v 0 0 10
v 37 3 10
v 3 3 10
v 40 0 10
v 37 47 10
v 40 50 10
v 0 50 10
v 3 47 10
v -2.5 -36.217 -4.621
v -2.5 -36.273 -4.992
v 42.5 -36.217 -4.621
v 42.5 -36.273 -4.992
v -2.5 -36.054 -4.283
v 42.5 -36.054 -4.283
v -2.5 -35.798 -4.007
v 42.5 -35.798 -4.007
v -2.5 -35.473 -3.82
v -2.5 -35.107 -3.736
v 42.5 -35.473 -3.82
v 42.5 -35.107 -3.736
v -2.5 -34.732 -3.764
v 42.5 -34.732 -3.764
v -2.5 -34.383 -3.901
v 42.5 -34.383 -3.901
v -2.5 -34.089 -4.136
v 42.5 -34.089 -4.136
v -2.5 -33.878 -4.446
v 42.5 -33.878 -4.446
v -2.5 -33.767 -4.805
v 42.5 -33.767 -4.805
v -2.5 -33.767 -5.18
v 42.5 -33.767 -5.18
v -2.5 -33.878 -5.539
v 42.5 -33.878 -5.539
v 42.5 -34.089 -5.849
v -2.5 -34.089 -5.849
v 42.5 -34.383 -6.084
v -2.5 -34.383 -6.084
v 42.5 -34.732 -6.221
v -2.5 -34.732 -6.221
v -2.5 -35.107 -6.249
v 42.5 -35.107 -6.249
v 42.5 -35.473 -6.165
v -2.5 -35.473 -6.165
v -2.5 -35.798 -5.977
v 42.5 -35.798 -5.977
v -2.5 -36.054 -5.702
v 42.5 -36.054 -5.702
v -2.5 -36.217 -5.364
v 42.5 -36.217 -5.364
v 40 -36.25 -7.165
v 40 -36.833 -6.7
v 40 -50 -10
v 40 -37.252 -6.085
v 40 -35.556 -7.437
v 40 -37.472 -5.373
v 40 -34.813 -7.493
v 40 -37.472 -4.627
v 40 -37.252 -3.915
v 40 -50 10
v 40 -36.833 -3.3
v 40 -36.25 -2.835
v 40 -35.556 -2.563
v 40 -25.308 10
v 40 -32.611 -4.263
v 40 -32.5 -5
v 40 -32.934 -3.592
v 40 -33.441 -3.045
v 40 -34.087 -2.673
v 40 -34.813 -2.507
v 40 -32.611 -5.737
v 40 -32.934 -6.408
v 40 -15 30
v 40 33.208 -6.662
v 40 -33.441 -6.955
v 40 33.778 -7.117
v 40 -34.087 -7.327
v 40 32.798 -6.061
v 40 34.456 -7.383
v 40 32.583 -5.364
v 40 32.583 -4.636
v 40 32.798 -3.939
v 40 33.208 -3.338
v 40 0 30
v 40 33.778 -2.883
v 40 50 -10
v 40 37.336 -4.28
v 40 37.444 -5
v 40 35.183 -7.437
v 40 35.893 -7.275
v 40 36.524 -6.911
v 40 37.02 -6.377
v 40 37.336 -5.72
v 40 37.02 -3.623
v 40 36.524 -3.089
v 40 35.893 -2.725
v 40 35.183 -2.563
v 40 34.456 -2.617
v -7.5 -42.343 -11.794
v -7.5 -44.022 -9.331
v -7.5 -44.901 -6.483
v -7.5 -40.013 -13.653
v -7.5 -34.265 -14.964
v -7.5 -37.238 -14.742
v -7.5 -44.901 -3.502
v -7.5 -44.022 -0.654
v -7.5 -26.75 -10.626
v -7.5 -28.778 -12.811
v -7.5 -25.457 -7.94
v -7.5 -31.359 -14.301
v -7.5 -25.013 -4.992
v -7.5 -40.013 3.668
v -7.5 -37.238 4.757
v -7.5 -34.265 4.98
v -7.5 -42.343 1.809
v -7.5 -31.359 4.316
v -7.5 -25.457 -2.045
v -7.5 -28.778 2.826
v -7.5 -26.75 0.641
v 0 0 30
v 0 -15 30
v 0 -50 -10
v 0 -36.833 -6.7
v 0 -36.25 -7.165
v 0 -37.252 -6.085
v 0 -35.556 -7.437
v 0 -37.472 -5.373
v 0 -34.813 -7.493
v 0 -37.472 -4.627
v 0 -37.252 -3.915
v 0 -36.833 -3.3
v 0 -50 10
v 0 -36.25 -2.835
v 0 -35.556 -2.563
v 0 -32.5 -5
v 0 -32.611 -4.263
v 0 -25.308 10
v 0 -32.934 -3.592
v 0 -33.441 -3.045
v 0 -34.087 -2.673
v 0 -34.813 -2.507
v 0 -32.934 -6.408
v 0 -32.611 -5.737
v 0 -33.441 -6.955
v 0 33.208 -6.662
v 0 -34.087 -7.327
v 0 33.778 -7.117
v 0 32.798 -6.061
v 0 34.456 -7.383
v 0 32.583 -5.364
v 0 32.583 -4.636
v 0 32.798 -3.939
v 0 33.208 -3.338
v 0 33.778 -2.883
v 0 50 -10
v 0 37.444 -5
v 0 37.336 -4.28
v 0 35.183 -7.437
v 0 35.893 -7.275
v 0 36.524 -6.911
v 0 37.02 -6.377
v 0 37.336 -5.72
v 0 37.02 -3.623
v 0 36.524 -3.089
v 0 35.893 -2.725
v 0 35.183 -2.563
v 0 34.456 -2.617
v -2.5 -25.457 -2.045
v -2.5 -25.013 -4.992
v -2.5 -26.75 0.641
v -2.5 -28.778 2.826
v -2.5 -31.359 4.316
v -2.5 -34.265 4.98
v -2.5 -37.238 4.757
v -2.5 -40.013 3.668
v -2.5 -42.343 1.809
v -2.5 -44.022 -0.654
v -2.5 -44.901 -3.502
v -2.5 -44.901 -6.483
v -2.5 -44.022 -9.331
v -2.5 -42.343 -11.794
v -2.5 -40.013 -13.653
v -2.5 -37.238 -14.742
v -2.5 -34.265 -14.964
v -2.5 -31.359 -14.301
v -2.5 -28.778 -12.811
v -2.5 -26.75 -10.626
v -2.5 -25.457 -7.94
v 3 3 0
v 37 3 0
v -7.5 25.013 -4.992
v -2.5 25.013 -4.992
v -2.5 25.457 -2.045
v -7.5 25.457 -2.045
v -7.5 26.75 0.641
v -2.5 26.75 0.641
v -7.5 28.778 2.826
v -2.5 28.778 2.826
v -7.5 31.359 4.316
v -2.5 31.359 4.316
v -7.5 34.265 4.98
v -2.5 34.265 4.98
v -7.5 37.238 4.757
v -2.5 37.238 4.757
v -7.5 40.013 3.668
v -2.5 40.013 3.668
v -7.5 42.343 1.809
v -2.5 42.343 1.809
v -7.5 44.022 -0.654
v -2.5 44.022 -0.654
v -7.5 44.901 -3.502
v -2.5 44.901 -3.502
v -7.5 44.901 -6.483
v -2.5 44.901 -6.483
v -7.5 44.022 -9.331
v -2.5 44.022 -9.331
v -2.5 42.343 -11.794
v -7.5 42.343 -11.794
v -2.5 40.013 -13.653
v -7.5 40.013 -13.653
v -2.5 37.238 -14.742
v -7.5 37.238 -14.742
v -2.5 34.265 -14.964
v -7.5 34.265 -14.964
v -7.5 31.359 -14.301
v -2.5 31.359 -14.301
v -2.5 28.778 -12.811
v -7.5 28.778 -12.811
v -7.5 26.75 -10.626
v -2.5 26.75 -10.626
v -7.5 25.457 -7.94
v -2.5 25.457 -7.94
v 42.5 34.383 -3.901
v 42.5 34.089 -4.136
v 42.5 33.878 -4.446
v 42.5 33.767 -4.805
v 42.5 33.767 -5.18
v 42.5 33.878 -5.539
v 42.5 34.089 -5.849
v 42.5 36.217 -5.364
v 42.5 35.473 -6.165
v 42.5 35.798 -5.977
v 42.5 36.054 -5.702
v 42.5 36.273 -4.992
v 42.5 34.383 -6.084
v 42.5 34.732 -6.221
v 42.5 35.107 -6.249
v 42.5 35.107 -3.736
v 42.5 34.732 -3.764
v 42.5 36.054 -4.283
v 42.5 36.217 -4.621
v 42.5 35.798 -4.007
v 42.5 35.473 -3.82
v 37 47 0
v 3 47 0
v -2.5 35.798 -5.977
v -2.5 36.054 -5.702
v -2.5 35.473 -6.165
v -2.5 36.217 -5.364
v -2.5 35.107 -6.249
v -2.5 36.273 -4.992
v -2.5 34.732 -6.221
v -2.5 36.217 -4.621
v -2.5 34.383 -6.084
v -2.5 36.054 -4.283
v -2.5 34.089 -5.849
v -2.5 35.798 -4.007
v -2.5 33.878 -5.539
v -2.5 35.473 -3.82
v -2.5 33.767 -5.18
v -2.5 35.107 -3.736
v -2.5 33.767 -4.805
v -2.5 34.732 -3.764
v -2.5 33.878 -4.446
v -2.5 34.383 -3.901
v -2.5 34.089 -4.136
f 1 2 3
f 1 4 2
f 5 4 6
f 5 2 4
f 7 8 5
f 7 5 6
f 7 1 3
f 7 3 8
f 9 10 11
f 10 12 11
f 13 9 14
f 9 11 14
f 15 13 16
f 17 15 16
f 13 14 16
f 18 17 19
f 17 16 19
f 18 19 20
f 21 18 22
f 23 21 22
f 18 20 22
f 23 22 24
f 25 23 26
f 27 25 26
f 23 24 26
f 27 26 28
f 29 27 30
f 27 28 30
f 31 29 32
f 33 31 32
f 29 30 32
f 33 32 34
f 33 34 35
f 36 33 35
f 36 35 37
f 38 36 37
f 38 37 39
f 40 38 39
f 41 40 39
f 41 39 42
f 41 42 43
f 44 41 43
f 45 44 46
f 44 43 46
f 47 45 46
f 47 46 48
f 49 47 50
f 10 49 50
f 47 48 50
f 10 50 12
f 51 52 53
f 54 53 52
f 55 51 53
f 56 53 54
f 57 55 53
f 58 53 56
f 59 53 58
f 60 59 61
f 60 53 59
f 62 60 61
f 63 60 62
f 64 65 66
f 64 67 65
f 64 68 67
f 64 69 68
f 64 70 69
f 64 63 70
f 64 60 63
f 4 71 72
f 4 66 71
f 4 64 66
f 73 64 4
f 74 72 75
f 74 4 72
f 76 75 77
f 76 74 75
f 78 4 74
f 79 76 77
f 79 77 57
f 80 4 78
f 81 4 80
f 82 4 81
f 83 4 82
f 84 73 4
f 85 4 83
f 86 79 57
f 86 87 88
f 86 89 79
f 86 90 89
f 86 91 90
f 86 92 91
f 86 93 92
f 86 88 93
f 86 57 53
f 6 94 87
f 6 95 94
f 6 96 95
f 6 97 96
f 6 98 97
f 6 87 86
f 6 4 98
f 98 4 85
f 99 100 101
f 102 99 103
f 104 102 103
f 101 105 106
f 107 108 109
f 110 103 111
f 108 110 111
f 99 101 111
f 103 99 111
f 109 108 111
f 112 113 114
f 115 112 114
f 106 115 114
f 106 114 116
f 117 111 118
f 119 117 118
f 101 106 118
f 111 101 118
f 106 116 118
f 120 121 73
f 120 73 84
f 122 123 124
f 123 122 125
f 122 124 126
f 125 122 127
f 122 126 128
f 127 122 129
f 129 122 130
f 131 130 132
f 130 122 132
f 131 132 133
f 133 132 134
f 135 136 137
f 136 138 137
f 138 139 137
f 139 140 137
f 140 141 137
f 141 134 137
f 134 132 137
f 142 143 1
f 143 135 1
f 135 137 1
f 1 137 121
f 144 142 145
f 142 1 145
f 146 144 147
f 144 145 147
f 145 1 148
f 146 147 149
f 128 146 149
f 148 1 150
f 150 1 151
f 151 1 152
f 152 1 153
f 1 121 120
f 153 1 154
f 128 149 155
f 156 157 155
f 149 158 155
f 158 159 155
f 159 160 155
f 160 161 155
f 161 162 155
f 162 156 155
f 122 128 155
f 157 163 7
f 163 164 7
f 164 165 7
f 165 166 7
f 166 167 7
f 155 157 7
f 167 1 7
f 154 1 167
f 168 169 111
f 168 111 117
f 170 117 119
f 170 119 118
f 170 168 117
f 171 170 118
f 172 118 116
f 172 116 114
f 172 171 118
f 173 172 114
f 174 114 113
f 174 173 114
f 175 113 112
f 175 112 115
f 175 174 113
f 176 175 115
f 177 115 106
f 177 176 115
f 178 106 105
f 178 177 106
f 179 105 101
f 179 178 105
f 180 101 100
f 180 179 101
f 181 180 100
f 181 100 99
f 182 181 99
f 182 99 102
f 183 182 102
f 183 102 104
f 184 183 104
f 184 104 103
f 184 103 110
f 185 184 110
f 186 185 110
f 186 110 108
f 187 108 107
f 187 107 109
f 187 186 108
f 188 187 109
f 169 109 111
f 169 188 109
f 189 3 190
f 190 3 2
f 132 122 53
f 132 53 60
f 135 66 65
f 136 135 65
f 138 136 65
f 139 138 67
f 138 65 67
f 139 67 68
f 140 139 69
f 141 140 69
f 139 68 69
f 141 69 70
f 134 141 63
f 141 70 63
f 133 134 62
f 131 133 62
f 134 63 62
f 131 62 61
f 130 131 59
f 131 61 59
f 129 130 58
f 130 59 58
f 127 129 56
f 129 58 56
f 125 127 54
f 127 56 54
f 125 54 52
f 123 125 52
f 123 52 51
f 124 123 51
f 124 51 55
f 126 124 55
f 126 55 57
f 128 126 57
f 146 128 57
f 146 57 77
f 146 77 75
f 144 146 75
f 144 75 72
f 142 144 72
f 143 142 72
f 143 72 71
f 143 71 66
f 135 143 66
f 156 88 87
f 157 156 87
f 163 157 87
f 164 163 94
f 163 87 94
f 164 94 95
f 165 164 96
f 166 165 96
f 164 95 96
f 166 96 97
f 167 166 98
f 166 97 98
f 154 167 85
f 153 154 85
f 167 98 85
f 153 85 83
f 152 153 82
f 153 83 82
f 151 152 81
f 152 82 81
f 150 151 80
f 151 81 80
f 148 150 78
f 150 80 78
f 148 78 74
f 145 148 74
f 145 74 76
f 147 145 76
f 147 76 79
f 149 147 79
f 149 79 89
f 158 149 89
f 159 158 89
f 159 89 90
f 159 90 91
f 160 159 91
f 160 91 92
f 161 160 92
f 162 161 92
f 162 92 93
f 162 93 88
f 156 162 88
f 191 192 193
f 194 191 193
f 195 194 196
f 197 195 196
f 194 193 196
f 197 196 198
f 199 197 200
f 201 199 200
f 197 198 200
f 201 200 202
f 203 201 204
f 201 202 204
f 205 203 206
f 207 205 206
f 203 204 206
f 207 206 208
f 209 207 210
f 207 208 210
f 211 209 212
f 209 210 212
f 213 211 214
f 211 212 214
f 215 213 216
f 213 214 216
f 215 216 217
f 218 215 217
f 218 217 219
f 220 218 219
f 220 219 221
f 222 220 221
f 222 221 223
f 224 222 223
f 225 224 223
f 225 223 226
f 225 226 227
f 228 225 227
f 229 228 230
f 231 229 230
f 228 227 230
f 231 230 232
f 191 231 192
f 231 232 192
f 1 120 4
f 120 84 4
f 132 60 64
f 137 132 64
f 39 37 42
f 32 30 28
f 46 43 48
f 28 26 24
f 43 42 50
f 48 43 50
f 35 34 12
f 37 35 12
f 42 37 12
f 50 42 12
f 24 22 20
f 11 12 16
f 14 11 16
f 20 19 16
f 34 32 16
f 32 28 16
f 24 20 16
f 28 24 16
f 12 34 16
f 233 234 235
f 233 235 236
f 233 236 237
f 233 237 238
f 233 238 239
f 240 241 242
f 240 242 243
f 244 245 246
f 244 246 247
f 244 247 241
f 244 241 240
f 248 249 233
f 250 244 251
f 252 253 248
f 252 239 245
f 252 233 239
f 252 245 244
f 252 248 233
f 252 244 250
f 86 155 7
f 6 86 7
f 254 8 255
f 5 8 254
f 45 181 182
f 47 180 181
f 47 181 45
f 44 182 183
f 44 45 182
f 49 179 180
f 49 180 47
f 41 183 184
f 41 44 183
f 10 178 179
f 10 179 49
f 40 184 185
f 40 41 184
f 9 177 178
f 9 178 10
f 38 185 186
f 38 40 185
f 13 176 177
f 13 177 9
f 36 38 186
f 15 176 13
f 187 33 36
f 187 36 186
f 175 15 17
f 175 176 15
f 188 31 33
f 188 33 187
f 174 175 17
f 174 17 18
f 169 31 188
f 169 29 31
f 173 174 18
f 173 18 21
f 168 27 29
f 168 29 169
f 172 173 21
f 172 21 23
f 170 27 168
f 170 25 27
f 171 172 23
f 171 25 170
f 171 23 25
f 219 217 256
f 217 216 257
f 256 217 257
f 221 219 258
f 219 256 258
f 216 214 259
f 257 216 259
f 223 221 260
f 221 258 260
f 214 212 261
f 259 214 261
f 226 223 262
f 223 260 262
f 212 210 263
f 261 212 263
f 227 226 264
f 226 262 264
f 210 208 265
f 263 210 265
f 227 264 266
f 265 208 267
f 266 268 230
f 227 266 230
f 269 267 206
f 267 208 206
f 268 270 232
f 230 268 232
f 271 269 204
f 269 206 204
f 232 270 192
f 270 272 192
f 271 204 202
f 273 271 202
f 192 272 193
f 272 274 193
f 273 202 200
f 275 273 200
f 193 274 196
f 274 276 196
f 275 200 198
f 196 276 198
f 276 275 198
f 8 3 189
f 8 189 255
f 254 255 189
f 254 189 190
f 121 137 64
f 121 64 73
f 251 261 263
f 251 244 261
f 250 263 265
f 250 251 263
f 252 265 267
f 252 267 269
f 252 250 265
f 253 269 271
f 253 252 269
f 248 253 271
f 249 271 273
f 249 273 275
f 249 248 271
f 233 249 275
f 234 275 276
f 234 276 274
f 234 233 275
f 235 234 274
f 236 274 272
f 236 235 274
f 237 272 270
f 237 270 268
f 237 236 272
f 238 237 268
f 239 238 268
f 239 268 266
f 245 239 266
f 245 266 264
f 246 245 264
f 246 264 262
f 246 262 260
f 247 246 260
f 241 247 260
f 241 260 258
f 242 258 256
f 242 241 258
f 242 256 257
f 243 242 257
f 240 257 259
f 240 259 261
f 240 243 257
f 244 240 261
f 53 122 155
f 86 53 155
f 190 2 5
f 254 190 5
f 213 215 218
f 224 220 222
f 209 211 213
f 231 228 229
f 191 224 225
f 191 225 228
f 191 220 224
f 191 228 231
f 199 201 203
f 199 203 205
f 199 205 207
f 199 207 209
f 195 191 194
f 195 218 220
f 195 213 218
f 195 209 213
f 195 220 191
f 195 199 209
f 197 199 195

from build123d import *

# Parameters (mm, degrees)
F0_W      = 100
F0_H      = 20
F1_DEPTH  = 40
F5_R      = 2.5
F5_R_2    = 2.444231729
F6_DEPTH  = 40.0010001
F7_W      = 34
F7_H      = 44
F8_DEPTH  = 10
F9_R      = 1.2598965516
F10_DEPTH = 42.5
F11_DEPTH = 2.5
F12_R     = 10
F13_DEPTH = 5


# Not quite as in the source:
# - a feature of the source that left no trace in its solid (it failed there, or was rolled back) is left out
# - the program builds the solid bodies; features that only make, move or delete a surface that nothing else refers to are left out


with BuildPart() as f1:
    # F0 (on Right) → F1 (new body)
    with BuildSketch(Plane.YZ):
        Rectangle(F0_W, F0_H)
    extrude(amount=F1_DEPTH)

    # F3 (on face) → F4 section 0
    with BuildSketch(Plane(origin=(0, 0, 0), x_dir=(0, -1, 0), z_dir=(-1, 0, 0))):
        Polygon((0, 30), (0, 10), (25.307764064, 10), (15, 30), align=None)
    # F2 (on face) → F4 section 1
    with BuildSketch(Plane.YZ.offset(40)):
        Polygon((-25.307764064, 10), (0, 10), (0, 30), (-15, 30), align=None)
    loft()

    # F5 (on face) → F6 (cut, through all)
    with BuildSketch(Plane.YZ.offset(40)):
        with Locations((-35, -5)):
            Circle(F5_R)
        with Locations((35, -5)):
            Circle(F5_R_2)
    extrude(amount=-F6_DEPTH, mode=Mode.SUBTRACT)

    # F7 (on face) → F8 (cut)
    with BuildSketch(Plane.XY.offset(10)):
        with Locations((20, 25)):
            Rectangle(F7_W, F7_H)
    extrude(amount=-F8_DEPTH, mode=Mode.SUBTRACT)


with BuildPart() as f10:
    # F9 (on Right) → F10 (new body)
    with BuildSketch(Plane.YZ):
        with Locations((35.0127312975, -4.9924484168)):
            Circle(F9_R)
    extrude(amount=F10_DEPTH)

    # F9 (on Right) → F11 (join)
    with BuildSketch(Plane.YZ):
        with Locations((35.0127312975, -4.9924484168)):
            Circle(F9_R)
    extrude(amount=-F11_DEPTH)

    # F12 (on face) → F13 (join)
    with BuildSketch(Plane(origin=(-2.5, 0, 0), x_dir=(0, -1, 0), z_dir=(-1, 0, 0))):
        with Locations((-35.0127312975, -4.9924484168)):
            Circle(F12_R)
    extrude(amount=F13_DEPTH)


with BuildPart() as f14_1:
    # F14: instance of F10
    add(f10.part.mirror(Plane.XZ))


solid = Compound([f1.part, f10.part, f14_1.part])
